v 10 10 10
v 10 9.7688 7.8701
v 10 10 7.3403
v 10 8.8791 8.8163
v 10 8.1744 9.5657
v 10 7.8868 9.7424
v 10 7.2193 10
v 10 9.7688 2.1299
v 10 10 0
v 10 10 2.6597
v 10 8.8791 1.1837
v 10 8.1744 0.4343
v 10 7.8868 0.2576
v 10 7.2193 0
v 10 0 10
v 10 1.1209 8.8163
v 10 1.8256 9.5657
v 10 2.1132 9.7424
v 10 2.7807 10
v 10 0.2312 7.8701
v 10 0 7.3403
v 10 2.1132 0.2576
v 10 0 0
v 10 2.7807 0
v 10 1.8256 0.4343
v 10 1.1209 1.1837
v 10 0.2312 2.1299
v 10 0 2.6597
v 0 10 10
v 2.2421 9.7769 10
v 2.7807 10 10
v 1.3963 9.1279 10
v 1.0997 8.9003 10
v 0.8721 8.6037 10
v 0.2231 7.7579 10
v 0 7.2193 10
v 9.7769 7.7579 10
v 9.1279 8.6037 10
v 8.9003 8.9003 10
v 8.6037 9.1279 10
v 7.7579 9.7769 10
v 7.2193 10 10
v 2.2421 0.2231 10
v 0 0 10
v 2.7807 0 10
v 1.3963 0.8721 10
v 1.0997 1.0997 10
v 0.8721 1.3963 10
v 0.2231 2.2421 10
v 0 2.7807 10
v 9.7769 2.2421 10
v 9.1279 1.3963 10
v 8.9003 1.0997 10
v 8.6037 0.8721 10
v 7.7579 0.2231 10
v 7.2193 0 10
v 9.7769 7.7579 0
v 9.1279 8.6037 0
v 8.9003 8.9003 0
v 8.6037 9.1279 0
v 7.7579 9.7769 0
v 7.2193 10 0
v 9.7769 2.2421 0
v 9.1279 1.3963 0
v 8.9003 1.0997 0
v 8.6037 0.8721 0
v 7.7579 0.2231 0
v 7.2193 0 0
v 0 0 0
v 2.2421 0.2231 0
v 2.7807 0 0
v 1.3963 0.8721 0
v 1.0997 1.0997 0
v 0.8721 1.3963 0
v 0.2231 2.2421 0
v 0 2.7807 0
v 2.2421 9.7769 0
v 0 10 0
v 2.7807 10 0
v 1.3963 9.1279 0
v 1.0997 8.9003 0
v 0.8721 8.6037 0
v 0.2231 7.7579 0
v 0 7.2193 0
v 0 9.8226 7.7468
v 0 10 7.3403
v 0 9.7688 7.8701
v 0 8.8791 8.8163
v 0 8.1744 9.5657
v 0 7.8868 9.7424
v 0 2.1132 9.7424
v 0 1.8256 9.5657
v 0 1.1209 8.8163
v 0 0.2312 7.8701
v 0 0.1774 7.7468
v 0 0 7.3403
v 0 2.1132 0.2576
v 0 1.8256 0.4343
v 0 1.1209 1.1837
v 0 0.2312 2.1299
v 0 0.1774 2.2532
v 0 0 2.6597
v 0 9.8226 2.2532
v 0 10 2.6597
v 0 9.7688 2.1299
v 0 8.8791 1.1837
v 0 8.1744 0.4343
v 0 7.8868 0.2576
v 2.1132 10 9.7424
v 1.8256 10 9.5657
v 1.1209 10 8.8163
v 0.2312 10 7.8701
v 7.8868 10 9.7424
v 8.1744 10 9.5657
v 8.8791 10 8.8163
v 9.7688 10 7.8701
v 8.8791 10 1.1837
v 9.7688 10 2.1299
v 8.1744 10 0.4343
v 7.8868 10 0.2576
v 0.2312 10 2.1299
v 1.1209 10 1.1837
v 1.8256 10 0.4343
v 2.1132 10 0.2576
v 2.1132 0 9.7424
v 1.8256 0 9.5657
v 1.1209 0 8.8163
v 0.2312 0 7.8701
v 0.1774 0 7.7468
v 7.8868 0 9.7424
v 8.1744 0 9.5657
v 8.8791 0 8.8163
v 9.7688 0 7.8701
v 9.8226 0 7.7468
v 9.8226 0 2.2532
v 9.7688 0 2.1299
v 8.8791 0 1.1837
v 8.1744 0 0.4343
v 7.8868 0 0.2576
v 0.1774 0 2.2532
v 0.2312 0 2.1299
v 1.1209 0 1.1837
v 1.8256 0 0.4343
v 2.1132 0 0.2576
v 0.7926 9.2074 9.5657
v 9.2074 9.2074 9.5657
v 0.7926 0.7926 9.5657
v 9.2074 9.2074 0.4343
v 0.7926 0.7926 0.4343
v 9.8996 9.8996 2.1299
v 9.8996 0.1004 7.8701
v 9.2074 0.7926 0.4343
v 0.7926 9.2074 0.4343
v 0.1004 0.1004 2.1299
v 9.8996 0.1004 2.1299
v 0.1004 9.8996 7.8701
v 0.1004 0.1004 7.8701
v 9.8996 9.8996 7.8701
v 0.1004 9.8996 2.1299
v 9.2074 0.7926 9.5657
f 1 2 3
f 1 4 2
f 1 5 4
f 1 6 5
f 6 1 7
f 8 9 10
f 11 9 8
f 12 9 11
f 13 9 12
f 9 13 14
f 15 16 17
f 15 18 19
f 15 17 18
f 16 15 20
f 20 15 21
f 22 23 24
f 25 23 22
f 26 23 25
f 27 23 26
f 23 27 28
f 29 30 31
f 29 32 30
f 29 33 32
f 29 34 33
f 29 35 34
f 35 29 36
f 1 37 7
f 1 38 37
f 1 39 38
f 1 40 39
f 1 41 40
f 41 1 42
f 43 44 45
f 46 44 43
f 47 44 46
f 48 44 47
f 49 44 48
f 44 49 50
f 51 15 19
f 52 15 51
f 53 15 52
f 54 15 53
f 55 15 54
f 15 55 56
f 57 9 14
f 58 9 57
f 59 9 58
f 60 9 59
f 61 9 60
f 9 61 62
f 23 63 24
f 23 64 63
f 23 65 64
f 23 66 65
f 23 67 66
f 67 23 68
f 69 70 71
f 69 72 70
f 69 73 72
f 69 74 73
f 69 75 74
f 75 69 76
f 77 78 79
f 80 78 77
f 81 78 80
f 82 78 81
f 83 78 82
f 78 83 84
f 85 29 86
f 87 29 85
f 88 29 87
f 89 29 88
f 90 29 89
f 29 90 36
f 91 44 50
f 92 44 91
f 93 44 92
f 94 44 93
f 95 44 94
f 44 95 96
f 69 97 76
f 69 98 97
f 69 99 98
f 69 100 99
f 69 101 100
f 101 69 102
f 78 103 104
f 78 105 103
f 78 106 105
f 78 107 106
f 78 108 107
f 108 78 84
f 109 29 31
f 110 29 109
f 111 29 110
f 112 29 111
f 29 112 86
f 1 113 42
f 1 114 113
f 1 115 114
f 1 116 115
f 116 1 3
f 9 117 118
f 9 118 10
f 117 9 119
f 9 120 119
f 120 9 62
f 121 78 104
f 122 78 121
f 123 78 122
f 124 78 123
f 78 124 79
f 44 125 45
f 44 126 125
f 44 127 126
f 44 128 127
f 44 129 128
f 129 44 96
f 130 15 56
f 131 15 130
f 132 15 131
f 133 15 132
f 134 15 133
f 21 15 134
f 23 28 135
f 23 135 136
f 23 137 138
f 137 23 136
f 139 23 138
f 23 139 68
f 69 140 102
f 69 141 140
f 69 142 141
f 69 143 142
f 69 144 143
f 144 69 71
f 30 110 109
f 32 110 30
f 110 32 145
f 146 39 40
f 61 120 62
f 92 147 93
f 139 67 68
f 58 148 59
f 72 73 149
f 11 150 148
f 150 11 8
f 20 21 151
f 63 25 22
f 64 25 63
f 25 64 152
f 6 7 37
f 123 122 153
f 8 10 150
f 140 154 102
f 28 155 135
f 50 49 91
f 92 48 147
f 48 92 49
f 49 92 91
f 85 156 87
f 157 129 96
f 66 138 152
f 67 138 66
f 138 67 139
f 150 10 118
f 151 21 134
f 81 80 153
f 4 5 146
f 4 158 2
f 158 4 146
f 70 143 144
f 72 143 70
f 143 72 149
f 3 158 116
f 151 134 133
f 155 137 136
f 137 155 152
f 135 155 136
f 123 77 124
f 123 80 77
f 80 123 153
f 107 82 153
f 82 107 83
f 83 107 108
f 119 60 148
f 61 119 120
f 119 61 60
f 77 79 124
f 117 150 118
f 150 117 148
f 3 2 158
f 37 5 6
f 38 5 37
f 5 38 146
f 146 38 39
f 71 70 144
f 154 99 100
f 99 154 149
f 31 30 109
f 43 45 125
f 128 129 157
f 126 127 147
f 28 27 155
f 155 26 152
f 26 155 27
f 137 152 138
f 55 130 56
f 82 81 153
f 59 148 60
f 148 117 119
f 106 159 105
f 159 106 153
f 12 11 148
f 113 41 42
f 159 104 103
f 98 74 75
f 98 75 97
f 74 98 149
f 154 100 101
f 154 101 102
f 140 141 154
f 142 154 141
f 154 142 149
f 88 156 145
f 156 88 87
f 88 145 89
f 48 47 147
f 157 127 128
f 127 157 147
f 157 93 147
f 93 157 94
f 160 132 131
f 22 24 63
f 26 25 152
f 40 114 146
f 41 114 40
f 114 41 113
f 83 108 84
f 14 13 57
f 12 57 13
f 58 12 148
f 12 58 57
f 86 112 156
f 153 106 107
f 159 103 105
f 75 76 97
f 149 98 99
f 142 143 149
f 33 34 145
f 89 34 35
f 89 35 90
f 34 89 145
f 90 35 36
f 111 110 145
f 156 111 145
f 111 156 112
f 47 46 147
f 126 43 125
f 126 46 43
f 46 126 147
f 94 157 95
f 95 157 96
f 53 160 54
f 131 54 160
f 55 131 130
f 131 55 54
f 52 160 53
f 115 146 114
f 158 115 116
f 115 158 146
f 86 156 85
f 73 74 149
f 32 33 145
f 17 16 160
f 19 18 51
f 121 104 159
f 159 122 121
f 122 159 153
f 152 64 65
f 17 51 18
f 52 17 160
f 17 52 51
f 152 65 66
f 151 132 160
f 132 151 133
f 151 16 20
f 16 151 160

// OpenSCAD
r=5;
difference(){
    
    cube(2*r);
    translate([r,r,r])
    sphere(1.5*r);
}
